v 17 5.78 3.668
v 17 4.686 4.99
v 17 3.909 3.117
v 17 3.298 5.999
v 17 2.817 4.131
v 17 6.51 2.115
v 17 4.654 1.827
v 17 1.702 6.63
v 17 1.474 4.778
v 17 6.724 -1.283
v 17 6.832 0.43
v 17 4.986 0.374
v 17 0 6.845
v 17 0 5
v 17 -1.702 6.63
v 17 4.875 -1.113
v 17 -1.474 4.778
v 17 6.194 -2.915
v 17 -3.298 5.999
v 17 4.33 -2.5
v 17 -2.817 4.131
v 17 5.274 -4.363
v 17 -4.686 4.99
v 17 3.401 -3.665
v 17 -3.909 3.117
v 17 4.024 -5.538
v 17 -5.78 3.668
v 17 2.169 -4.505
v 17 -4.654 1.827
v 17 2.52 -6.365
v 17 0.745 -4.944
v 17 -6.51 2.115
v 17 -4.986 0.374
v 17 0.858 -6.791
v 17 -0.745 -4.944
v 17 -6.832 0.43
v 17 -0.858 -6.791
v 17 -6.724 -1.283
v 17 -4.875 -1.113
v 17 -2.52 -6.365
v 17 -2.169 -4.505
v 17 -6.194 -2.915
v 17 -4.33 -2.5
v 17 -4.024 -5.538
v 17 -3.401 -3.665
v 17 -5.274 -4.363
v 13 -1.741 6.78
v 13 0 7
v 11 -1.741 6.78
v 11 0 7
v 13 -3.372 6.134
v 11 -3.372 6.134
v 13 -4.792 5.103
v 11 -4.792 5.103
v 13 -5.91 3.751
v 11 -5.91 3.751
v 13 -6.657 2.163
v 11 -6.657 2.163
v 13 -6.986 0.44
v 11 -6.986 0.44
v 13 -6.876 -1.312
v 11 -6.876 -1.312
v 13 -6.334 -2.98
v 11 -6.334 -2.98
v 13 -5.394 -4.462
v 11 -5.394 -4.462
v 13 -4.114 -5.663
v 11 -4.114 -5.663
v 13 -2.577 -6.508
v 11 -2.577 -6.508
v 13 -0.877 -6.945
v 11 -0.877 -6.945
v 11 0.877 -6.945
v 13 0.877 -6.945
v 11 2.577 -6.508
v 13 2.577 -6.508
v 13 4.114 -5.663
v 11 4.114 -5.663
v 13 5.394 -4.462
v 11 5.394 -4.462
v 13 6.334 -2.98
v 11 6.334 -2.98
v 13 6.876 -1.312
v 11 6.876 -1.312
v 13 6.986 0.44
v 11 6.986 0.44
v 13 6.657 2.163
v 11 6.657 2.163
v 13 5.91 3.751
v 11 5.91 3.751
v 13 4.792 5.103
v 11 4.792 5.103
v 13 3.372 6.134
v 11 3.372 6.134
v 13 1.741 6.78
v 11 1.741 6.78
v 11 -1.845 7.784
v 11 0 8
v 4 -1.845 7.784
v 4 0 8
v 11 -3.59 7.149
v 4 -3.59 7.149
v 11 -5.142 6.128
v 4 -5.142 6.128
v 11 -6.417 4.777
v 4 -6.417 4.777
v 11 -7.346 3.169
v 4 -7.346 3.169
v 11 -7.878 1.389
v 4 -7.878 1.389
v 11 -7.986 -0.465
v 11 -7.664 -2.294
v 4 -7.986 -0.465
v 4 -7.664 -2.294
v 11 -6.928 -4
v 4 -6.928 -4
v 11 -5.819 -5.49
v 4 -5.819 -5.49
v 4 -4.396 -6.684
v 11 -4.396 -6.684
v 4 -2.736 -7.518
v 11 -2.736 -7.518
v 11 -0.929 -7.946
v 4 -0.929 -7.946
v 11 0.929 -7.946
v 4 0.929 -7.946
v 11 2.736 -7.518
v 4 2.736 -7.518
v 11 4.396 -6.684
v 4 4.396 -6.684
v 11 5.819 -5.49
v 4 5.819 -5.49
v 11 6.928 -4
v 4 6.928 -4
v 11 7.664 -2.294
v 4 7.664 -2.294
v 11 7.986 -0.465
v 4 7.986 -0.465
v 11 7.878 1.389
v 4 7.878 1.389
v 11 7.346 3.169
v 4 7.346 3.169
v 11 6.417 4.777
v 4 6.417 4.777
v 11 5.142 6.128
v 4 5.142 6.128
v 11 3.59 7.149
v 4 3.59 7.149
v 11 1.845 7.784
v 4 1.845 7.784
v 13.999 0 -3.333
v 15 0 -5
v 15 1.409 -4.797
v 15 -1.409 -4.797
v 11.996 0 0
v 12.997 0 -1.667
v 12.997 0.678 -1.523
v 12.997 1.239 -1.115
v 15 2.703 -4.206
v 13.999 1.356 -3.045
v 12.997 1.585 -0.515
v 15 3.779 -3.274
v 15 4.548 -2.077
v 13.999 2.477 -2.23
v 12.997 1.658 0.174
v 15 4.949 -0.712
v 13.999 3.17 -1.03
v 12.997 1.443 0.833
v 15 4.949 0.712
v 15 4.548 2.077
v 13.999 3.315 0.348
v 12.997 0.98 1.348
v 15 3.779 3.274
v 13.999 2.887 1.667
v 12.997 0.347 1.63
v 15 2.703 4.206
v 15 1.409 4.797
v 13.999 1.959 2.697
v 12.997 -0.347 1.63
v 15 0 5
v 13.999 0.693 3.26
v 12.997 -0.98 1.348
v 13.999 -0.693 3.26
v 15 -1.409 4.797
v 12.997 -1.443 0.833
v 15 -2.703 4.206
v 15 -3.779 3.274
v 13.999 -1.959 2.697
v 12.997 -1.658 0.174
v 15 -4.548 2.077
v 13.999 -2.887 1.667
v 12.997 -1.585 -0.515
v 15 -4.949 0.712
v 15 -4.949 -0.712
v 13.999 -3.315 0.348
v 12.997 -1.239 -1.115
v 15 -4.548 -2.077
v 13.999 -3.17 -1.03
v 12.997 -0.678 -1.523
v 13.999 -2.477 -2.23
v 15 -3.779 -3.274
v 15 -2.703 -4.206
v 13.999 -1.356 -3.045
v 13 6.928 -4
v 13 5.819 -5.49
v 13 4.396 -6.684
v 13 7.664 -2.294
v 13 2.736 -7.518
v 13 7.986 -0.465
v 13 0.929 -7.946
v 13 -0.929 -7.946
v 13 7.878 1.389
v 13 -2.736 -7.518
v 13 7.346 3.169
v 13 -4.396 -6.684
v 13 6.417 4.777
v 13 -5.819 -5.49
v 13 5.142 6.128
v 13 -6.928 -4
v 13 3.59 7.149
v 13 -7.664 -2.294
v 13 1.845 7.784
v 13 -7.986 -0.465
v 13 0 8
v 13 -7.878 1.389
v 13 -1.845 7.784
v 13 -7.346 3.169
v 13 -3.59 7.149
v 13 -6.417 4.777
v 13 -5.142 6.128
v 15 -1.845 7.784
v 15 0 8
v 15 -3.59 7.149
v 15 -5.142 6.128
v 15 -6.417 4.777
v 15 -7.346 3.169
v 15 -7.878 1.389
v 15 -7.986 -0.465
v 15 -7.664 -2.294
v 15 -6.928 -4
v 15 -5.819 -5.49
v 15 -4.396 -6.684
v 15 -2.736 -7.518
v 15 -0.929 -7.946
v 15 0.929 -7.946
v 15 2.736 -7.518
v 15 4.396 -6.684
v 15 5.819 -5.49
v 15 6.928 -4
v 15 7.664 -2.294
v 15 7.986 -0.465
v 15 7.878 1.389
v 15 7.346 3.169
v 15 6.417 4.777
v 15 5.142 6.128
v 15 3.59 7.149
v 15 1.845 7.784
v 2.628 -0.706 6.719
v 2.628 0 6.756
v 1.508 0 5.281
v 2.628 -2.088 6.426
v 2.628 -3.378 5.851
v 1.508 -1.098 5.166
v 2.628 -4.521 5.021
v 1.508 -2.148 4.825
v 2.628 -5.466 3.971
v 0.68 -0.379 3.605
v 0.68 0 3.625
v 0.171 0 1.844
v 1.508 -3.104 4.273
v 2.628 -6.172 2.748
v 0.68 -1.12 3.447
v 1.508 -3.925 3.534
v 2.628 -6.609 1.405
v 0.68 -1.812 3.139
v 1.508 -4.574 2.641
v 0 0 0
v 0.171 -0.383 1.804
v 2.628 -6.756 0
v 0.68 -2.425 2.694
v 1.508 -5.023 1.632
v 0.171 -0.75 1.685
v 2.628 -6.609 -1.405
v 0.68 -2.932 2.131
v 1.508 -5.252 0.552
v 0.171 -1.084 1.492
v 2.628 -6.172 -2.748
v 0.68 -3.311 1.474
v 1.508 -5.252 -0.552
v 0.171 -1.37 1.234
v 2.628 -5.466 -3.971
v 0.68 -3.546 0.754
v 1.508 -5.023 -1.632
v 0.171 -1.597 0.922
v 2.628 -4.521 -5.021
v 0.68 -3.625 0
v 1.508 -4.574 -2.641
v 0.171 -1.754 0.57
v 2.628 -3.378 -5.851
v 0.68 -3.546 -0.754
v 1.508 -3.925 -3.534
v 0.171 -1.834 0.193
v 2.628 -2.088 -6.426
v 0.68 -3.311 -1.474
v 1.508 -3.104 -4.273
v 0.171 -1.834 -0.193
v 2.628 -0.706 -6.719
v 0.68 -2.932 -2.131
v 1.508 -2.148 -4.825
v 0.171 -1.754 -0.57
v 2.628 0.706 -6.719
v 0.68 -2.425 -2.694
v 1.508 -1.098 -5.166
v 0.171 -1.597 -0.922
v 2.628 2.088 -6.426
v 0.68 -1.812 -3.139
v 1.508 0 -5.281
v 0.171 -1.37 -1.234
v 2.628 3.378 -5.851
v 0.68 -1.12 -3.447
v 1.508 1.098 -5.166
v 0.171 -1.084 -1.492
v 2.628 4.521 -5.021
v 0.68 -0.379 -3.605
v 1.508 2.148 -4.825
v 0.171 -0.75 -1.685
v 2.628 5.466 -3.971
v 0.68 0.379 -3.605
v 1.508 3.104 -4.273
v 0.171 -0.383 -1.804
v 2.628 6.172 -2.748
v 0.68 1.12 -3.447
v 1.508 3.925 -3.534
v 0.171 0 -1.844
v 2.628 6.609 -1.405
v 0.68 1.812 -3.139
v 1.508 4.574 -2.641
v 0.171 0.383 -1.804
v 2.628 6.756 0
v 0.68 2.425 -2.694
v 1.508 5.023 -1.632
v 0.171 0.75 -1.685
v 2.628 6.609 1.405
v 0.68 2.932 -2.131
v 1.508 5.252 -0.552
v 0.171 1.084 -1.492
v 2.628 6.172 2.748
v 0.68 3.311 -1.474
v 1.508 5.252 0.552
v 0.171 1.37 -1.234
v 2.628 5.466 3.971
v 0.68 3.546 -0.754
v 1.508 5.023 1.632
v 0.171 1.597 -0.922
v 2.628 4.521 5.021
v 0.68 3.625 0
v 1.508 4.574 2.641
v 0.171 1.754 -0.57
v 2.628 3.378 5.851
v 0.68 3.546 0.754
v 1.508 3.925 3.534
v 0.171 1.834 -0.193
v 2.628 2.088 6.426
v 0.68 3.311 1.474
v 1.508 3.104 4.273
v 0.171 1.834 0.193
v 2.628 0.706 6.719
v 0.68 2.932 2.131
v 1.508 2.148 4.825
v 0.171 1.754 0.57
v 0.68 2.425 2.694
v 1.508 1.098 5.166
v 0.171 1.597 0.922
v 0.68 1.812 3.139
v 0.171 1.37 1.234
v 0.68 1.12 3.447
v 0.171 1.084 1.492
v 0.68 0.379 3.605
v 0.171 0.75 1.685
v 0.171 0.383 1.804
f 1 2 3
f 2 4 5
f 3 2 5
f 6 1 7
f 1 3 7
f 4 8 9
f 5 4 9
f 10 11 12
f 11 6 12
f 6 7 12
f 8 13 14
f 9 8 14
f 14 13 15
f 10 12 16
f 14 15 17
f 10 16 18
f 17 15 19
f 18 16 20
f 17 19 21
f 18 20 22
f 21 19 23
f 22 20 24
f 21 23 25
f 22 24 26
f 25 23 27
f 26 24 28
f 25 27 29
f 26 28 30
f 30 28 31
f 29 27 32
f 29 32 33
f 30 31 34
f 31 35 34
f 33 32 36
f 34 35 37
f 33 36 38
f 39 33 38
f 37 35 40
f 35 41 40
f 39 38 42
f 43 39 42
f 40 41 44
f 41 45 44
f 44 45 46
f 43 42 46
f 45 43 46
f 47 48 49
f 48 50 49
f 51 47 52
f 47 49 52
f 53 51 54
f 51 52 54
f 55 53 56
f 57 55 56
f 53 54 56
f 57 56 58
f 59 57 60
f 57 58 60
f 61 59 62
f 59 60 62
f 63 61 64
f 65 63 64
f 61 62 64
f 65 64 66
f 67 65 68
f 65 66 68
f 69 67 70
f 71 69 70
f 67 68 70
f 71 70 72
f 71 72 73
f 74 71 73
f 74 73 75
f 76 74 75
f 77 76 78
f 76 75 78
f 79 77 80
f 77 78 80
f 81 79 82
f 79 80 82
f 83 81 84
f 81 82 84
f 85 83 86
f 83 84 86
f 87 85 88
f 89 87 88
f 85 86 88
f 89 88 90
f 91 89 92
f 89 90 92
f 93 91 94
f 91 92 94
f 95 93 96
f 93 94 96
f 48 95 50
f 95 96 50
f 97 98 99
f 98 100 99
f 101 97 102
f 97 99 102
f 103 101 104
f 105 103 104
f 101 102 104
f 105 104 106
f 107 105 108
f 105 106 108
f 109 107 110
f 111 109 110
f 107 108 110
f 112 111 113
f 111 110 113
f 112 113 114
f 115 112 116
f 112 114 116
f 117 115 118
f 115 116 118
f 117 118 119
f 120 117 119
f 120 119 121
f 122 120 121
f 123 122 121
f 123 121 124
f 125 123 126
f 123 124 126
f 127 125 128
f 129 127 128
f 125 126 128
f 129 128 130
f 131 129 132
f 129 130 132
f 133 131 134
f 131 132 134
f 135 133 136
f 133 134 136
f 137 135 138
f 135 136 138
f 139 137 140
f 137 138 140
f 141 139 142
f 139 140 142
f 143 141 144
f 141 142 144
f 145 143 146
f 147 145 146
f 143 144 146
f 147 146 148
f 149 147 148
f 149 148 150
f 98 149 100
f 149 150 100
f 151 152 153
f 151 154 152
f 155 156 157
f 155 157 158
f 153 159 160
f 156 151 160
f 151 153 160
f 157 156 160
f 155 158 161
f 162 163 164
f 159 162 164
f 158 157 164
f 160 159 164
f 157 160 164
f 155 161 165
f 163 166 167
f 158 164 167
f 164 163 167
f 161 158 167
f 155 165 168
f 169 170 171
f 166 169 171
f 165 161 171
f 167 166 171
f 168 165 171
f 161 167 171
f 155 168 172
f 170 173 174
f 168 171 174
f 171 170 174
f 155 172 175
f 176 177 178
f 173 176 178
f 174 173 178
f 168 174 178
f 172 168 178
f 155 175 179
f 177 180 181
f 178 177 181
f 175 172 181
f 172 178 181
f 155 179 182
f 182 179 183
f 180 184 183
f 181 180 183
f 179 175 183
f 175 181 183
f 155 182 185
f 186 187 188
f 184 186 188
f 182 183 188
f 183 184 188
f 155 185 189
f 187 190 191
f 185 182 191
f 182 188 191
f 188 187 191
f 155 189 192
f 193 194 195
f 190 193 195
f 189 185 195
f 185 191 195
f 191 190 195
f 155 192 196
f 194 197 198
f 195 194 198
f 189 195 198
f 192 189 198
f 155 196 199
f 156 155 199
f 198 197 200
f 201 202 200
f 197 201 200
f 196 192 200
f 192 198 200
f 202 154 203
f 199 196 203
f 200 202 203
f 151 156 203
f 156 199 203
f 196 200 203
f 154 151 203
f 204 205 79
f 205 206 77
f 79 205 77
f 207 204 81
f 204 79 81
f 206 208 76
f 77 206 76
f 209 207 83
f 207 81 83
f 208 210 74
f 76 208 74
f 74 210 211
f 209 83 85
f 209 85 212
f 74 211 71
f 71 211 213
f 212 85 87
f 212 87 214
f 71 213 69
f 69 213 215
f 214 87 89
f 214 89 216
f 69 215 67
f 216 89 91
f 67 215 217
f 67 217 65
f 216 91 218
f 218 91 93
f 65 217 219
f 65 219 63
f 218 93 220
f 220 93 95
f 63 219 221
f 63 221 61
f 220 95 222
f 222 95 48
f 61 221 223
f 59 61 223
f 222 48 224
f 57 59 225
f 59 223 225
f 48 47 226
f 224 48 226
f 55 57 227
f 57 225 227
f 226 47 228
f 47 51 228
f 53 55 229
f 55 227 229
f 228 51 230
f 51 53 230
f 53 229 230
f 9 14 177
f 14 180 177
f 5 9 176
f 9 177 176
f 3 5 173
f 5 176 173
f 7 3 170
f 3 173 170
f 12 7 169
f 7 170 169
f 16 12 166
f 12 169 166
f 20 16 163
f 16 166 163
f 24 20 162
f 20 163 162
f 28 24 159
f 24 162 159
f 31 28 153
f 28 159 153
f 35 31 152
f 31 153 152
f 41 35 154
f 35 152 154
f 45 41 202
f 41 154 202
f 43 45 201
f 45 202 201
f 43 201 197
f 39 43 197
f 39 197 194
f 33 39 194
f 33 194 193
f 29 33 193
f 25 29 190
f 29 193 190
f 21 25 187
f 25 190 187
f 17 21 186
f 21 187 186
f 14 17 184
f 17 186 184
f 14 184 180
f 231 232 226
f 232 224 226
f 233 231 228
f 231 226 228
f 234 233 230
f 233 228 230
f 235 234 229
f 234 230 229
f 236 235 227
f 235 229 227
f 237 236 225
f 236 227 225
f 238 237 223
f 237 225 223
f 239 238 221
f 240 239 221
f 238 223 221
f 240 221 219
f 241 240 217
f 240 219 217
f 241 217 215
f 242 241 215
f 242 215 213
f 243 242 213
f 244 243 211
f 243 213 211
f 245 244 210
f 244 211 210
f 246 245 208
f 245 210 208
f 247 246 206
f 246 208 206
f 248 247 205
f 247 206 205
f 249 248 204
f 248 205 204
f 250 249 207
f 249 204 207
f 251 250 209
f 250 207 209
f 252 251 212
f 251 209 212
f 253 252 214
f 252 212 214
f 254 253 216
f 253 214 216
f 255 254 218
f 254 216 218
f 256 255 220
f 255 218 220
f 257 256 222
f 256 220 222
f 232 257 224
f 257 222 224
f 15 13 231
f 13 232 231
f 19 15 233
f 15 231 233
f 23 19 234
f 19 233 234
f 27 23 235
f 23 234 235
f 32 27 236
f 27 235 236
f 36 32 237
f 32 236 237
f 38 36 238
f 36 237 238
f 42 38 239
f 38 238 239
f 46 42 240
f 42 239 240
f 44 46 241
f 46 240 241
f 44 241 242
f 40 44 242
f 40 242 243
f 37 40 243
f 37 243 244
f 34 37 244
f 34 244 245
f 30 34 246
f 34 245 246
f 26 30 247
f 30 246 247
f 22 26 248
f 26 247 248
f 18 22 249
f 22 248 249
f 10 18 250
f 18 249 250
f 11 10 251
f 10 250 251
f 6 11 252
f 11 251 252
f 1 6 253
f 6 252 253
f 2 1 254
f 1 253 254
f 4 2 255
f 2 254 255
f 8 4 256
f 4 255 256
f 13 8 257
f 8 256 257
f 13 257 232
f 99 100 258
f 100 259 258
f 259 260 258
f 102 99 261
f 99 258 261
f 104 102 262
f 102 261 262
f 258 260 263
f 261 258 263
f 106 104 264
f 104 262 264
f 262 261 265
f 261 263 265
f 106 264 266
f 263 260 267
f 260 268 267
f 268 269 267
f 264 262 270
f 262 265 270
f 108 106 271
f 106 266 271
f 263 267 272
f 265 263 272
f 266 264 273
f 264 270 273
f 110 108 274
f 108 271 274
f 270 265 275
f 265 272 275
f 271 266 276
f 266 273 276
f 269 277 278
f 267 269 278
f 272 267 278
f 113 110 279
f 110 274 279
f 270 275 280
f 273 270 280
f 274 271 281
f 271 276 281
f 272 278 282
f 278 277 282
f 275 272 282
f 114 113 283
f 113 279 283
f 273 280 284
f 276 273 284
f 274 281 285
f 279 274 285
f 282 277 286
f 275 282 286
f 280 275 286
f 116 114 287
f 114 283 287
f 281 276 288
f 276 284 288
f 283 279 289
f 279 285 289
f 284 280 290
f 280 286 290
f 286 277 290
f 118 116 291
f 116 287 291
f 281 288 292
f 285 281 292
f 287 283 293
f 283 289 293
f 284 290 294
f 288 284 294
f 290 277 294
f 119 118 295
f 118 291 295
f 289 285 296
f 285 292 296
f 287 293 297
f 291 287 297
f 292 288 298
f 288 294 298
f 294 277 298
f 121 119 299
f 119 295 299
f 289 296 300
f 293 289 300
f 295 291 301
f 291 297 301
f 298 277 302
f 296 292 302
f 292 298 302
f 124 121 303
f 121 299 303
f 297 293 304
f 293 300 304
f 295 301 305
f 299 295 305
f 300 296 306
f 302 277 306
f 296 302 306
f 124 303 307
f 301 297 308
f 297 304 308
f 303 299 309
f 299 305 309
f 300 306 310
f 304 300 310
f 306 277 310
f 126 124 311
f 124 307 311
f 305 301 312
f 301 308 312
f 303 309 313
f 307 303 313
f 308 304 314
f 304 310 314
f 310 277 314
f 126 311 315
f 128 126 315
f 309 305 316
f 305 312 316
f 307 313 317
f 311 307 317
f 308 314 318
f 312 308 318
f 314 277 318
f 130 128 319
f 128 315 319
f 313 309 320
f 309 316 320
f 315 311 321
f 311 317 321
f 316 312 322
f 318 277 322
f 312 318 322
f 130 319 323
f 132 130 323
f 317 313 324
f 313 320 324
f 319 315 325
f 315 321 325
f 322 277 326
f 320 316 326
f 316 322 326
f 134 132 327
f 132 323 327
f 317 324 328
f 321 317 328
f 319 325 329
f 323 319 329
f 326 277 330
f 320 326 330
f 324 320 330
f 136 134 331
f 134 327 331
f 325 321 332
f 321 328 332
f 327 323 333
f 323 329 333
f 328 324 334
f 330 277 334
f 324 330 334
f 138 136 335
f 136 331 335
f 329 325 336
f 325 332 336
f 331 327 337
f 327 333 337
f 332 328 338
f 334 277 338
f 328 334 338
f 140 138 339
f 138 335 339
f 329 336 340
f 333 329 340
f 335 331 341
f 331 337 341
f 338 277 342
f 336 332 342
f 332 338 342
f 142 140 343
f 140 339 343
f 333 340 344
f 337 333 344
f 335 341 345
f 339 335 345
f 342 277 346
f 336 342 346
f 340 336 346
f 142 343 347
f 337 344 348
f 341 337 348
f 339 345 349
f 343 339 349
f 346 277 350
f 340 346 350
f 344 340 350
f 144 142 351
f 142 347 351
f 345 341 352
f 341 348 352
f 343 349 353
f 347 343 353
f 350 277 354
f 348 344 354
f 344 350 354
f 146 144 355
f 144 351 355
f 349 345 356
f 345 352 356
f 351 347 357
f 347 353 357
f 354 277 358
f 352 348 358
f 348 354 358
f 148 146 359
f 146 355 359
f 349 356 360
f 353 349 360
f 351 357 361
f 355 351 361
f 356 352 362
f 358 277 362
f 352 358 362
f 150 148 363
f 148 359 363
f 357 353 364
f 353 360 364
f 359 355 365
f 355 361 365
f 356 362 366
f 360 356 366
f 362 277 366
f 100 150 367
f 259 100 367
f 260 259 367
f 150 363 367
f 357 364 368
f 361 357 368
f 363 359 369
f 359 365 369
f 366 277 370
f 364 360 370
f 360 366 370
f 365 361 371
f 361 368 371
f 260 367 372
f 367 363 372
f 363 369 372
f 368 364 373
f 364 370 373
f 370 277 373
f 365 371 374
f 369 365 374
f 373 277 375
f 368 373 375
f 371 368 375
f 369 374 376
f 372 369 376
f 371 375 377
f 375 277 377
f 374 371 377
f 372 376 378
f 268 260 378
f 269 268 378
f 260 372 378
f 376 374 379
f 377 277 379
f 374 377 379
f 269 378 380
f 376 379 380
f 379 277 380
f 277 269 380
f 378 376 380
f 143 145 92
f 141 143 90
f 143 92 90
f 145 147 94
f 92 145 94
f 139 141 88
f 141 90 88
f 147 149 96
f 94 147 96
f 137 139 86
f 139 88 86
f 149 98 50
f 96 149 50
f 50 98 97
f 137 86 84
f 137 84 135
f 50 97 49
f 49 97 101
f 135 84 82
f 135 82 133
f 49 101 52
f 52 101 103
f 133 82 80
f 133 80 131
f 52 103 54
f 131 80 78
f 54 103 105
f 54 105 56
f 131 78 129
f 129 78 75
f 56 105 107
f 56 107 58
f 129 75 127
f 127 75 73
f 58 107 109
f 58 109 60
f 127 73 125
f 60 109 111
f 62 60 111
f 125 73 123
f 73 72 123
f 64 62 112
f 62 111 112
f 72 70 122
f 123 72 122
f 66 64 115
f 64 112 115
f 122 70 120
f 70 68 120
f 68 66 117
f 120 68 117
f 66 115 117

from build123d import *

# Parameters (mm, degrees)
F_10_0_10_DIAMETER_HOLE1_D     = 10
F_10_0_10_DIAMETER_HOLE1_DEPTH = 2
F_10_0_10_DIAMETER_HOLE1_TIP   = 3.004303095


with BuildPart() as part:
    # Sketch1 → Revolve1 (revolve)
    with BuildSketch(Plane.XY, mode=Mode.PRIVATE) as revolve1_sk:
        with BuildLine():
            Line((17, 0), (17, 6.845299462))
            Line((17, 6.845299462), (15, 8))
            Line((15, 8), (13, 8))
            Line((13, 8), (13, 7))
            Line((13, 7), (11, 7))
            Line((11, 7), (11, 8))
            Line((11, 8), (4, 8))
            ThreePointArc((4, 8), (1.05572809, 4.472135955), (0, 0))
            Line((0, 0), (17, 0))
        make_face()
    revolve(revolve1_sk.sketch.rotate(Axis((0, 0, 0), (1, 0, 0)), 90), axis=Axis((0, 0, 0), (1, 0, 0)))

    # Ø10.0 (10) Diameter Hole1
    with Locations(Plane(origin=(17, 0, 0), x_dir=(0, 0, -1), z_dir=(1, 0, 0))):
        with Locations((0, 0)):
            Hole(F_10_0_10_DIAMETER_HOLE1_D / 2, depth=F_10_0_10_DIAMETER_HOLE1_DEPTH)
            with Locations((0, 0, -(F_10_0_10_DIAMETER_HOLE1_DEPTH + F_10_0_10_DIAMETER_HOLE1_TIP / 2))):  # 118° drill point
                Cone(0, F_10_0_10_DIAMETER_HOLE1_D / 2, F_10_0_10_DIAMETER_HOLE1_TIP, mode=Mode.SUBTRACT)


solid = part.part
